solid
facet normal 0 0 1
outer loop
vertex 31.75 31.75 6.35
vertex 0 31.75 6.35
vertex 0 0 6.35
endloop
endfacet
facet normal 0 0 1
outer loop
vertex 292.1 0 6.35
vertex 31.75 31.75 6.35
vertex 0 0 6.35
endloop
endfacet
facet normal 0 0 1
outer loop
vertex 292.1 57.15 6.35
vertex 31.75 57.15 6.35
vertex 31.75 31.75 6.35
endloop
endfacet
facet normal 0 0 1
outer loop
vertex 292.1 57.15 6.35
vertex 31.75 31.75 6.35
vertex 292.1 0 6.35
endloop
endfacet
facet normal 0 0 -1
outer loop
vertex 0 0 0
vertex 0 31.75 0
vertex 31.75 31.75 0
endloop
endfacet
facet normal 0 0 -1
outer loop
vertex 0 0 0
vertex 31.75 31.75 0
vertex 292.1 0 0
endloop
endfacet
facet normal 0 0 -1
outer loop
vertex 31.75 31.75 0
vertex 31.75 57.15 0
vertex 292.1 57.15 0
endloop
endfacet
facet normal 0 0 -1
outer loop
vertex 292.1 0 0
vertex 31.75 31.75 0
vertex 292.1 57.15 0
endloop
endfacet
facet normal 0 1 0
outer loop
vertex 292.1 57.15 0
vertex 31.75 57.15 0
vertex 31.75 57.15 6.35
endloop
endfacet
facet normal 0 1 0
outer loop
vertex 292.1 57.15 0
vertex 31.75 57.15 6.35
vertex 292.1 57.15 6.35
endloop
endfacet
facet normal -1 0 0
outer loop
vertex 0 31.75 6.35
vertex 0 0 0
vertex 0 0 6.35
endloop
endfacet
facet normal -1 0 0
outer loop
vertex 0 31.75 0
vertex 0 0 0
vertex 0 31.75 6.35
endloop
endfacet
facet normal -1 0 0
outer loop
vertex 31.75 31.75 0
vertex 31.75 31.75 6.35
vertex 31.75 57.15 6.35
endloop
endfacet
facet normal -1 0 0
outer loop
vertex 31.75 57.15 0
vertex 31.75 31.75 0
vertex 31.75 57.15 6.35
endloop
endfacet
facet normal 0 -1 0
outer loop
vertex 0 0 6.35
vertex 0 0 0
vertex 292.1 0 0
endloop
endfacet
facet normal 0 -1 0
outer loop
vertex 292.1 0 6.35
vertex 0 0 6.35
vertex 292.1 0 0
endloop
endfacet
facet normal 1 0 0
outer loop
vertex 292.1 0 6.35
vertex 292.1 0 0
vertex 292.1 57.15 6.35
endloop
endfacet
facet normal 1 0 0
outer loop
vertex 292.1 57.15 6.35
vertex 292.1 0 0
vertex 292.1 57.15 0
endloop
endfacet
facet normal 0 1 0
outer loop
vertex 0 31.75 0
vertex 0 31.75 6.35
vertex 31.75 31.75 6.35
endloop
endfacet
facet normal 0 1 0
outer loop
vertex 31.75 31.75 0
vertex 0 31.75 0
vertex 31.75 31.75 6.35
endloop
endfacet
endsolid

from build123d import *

# Parameters (mm, degrees)
SKETCH1_W               = 292.1
SKETCH1_H               = 57.15
BOSS_EXTRUDE1_DEPTH     = 6.35
SKETCH3_W               = 31.75
SKETCH3_H               = 25.4
CUT_EXTRUDE2_DEPTH      = 1
CUT_EXTRUDE2_DEPTH_BACK = 7.35


with BuildPart() as part:
    # Sketch1 → Boss-Extrude1 (new body)
    with BuildSketch(Plane.XY):
        with Locations((146.05, 28.575)):
            Rectangle(SKETCH1_W, SKETCH1_H)
    extrude(amount=BOSS_EXTRUDE1_DEPTH)

    # Sketch3 → Cut-Extrude2 (cut, two sides)
    with BuildSketch(Plane.XY.offset(6.35)) as cut_extrude2_sk:
        with Locations((15.875, 44.45)):
            Rectangle(SKETCH3_W, SKETCH3_H)
    extrude(amount=CUT_EXTRUDE2_DEPTH, mode=Mode.SUBTRACT)
    extrude(cut_extrude2_sk.sketch, amount=-CUT_EXTRUDE2_DEPTH_BACK, mode=Mode.SUBTRACT)


solid = part.part
